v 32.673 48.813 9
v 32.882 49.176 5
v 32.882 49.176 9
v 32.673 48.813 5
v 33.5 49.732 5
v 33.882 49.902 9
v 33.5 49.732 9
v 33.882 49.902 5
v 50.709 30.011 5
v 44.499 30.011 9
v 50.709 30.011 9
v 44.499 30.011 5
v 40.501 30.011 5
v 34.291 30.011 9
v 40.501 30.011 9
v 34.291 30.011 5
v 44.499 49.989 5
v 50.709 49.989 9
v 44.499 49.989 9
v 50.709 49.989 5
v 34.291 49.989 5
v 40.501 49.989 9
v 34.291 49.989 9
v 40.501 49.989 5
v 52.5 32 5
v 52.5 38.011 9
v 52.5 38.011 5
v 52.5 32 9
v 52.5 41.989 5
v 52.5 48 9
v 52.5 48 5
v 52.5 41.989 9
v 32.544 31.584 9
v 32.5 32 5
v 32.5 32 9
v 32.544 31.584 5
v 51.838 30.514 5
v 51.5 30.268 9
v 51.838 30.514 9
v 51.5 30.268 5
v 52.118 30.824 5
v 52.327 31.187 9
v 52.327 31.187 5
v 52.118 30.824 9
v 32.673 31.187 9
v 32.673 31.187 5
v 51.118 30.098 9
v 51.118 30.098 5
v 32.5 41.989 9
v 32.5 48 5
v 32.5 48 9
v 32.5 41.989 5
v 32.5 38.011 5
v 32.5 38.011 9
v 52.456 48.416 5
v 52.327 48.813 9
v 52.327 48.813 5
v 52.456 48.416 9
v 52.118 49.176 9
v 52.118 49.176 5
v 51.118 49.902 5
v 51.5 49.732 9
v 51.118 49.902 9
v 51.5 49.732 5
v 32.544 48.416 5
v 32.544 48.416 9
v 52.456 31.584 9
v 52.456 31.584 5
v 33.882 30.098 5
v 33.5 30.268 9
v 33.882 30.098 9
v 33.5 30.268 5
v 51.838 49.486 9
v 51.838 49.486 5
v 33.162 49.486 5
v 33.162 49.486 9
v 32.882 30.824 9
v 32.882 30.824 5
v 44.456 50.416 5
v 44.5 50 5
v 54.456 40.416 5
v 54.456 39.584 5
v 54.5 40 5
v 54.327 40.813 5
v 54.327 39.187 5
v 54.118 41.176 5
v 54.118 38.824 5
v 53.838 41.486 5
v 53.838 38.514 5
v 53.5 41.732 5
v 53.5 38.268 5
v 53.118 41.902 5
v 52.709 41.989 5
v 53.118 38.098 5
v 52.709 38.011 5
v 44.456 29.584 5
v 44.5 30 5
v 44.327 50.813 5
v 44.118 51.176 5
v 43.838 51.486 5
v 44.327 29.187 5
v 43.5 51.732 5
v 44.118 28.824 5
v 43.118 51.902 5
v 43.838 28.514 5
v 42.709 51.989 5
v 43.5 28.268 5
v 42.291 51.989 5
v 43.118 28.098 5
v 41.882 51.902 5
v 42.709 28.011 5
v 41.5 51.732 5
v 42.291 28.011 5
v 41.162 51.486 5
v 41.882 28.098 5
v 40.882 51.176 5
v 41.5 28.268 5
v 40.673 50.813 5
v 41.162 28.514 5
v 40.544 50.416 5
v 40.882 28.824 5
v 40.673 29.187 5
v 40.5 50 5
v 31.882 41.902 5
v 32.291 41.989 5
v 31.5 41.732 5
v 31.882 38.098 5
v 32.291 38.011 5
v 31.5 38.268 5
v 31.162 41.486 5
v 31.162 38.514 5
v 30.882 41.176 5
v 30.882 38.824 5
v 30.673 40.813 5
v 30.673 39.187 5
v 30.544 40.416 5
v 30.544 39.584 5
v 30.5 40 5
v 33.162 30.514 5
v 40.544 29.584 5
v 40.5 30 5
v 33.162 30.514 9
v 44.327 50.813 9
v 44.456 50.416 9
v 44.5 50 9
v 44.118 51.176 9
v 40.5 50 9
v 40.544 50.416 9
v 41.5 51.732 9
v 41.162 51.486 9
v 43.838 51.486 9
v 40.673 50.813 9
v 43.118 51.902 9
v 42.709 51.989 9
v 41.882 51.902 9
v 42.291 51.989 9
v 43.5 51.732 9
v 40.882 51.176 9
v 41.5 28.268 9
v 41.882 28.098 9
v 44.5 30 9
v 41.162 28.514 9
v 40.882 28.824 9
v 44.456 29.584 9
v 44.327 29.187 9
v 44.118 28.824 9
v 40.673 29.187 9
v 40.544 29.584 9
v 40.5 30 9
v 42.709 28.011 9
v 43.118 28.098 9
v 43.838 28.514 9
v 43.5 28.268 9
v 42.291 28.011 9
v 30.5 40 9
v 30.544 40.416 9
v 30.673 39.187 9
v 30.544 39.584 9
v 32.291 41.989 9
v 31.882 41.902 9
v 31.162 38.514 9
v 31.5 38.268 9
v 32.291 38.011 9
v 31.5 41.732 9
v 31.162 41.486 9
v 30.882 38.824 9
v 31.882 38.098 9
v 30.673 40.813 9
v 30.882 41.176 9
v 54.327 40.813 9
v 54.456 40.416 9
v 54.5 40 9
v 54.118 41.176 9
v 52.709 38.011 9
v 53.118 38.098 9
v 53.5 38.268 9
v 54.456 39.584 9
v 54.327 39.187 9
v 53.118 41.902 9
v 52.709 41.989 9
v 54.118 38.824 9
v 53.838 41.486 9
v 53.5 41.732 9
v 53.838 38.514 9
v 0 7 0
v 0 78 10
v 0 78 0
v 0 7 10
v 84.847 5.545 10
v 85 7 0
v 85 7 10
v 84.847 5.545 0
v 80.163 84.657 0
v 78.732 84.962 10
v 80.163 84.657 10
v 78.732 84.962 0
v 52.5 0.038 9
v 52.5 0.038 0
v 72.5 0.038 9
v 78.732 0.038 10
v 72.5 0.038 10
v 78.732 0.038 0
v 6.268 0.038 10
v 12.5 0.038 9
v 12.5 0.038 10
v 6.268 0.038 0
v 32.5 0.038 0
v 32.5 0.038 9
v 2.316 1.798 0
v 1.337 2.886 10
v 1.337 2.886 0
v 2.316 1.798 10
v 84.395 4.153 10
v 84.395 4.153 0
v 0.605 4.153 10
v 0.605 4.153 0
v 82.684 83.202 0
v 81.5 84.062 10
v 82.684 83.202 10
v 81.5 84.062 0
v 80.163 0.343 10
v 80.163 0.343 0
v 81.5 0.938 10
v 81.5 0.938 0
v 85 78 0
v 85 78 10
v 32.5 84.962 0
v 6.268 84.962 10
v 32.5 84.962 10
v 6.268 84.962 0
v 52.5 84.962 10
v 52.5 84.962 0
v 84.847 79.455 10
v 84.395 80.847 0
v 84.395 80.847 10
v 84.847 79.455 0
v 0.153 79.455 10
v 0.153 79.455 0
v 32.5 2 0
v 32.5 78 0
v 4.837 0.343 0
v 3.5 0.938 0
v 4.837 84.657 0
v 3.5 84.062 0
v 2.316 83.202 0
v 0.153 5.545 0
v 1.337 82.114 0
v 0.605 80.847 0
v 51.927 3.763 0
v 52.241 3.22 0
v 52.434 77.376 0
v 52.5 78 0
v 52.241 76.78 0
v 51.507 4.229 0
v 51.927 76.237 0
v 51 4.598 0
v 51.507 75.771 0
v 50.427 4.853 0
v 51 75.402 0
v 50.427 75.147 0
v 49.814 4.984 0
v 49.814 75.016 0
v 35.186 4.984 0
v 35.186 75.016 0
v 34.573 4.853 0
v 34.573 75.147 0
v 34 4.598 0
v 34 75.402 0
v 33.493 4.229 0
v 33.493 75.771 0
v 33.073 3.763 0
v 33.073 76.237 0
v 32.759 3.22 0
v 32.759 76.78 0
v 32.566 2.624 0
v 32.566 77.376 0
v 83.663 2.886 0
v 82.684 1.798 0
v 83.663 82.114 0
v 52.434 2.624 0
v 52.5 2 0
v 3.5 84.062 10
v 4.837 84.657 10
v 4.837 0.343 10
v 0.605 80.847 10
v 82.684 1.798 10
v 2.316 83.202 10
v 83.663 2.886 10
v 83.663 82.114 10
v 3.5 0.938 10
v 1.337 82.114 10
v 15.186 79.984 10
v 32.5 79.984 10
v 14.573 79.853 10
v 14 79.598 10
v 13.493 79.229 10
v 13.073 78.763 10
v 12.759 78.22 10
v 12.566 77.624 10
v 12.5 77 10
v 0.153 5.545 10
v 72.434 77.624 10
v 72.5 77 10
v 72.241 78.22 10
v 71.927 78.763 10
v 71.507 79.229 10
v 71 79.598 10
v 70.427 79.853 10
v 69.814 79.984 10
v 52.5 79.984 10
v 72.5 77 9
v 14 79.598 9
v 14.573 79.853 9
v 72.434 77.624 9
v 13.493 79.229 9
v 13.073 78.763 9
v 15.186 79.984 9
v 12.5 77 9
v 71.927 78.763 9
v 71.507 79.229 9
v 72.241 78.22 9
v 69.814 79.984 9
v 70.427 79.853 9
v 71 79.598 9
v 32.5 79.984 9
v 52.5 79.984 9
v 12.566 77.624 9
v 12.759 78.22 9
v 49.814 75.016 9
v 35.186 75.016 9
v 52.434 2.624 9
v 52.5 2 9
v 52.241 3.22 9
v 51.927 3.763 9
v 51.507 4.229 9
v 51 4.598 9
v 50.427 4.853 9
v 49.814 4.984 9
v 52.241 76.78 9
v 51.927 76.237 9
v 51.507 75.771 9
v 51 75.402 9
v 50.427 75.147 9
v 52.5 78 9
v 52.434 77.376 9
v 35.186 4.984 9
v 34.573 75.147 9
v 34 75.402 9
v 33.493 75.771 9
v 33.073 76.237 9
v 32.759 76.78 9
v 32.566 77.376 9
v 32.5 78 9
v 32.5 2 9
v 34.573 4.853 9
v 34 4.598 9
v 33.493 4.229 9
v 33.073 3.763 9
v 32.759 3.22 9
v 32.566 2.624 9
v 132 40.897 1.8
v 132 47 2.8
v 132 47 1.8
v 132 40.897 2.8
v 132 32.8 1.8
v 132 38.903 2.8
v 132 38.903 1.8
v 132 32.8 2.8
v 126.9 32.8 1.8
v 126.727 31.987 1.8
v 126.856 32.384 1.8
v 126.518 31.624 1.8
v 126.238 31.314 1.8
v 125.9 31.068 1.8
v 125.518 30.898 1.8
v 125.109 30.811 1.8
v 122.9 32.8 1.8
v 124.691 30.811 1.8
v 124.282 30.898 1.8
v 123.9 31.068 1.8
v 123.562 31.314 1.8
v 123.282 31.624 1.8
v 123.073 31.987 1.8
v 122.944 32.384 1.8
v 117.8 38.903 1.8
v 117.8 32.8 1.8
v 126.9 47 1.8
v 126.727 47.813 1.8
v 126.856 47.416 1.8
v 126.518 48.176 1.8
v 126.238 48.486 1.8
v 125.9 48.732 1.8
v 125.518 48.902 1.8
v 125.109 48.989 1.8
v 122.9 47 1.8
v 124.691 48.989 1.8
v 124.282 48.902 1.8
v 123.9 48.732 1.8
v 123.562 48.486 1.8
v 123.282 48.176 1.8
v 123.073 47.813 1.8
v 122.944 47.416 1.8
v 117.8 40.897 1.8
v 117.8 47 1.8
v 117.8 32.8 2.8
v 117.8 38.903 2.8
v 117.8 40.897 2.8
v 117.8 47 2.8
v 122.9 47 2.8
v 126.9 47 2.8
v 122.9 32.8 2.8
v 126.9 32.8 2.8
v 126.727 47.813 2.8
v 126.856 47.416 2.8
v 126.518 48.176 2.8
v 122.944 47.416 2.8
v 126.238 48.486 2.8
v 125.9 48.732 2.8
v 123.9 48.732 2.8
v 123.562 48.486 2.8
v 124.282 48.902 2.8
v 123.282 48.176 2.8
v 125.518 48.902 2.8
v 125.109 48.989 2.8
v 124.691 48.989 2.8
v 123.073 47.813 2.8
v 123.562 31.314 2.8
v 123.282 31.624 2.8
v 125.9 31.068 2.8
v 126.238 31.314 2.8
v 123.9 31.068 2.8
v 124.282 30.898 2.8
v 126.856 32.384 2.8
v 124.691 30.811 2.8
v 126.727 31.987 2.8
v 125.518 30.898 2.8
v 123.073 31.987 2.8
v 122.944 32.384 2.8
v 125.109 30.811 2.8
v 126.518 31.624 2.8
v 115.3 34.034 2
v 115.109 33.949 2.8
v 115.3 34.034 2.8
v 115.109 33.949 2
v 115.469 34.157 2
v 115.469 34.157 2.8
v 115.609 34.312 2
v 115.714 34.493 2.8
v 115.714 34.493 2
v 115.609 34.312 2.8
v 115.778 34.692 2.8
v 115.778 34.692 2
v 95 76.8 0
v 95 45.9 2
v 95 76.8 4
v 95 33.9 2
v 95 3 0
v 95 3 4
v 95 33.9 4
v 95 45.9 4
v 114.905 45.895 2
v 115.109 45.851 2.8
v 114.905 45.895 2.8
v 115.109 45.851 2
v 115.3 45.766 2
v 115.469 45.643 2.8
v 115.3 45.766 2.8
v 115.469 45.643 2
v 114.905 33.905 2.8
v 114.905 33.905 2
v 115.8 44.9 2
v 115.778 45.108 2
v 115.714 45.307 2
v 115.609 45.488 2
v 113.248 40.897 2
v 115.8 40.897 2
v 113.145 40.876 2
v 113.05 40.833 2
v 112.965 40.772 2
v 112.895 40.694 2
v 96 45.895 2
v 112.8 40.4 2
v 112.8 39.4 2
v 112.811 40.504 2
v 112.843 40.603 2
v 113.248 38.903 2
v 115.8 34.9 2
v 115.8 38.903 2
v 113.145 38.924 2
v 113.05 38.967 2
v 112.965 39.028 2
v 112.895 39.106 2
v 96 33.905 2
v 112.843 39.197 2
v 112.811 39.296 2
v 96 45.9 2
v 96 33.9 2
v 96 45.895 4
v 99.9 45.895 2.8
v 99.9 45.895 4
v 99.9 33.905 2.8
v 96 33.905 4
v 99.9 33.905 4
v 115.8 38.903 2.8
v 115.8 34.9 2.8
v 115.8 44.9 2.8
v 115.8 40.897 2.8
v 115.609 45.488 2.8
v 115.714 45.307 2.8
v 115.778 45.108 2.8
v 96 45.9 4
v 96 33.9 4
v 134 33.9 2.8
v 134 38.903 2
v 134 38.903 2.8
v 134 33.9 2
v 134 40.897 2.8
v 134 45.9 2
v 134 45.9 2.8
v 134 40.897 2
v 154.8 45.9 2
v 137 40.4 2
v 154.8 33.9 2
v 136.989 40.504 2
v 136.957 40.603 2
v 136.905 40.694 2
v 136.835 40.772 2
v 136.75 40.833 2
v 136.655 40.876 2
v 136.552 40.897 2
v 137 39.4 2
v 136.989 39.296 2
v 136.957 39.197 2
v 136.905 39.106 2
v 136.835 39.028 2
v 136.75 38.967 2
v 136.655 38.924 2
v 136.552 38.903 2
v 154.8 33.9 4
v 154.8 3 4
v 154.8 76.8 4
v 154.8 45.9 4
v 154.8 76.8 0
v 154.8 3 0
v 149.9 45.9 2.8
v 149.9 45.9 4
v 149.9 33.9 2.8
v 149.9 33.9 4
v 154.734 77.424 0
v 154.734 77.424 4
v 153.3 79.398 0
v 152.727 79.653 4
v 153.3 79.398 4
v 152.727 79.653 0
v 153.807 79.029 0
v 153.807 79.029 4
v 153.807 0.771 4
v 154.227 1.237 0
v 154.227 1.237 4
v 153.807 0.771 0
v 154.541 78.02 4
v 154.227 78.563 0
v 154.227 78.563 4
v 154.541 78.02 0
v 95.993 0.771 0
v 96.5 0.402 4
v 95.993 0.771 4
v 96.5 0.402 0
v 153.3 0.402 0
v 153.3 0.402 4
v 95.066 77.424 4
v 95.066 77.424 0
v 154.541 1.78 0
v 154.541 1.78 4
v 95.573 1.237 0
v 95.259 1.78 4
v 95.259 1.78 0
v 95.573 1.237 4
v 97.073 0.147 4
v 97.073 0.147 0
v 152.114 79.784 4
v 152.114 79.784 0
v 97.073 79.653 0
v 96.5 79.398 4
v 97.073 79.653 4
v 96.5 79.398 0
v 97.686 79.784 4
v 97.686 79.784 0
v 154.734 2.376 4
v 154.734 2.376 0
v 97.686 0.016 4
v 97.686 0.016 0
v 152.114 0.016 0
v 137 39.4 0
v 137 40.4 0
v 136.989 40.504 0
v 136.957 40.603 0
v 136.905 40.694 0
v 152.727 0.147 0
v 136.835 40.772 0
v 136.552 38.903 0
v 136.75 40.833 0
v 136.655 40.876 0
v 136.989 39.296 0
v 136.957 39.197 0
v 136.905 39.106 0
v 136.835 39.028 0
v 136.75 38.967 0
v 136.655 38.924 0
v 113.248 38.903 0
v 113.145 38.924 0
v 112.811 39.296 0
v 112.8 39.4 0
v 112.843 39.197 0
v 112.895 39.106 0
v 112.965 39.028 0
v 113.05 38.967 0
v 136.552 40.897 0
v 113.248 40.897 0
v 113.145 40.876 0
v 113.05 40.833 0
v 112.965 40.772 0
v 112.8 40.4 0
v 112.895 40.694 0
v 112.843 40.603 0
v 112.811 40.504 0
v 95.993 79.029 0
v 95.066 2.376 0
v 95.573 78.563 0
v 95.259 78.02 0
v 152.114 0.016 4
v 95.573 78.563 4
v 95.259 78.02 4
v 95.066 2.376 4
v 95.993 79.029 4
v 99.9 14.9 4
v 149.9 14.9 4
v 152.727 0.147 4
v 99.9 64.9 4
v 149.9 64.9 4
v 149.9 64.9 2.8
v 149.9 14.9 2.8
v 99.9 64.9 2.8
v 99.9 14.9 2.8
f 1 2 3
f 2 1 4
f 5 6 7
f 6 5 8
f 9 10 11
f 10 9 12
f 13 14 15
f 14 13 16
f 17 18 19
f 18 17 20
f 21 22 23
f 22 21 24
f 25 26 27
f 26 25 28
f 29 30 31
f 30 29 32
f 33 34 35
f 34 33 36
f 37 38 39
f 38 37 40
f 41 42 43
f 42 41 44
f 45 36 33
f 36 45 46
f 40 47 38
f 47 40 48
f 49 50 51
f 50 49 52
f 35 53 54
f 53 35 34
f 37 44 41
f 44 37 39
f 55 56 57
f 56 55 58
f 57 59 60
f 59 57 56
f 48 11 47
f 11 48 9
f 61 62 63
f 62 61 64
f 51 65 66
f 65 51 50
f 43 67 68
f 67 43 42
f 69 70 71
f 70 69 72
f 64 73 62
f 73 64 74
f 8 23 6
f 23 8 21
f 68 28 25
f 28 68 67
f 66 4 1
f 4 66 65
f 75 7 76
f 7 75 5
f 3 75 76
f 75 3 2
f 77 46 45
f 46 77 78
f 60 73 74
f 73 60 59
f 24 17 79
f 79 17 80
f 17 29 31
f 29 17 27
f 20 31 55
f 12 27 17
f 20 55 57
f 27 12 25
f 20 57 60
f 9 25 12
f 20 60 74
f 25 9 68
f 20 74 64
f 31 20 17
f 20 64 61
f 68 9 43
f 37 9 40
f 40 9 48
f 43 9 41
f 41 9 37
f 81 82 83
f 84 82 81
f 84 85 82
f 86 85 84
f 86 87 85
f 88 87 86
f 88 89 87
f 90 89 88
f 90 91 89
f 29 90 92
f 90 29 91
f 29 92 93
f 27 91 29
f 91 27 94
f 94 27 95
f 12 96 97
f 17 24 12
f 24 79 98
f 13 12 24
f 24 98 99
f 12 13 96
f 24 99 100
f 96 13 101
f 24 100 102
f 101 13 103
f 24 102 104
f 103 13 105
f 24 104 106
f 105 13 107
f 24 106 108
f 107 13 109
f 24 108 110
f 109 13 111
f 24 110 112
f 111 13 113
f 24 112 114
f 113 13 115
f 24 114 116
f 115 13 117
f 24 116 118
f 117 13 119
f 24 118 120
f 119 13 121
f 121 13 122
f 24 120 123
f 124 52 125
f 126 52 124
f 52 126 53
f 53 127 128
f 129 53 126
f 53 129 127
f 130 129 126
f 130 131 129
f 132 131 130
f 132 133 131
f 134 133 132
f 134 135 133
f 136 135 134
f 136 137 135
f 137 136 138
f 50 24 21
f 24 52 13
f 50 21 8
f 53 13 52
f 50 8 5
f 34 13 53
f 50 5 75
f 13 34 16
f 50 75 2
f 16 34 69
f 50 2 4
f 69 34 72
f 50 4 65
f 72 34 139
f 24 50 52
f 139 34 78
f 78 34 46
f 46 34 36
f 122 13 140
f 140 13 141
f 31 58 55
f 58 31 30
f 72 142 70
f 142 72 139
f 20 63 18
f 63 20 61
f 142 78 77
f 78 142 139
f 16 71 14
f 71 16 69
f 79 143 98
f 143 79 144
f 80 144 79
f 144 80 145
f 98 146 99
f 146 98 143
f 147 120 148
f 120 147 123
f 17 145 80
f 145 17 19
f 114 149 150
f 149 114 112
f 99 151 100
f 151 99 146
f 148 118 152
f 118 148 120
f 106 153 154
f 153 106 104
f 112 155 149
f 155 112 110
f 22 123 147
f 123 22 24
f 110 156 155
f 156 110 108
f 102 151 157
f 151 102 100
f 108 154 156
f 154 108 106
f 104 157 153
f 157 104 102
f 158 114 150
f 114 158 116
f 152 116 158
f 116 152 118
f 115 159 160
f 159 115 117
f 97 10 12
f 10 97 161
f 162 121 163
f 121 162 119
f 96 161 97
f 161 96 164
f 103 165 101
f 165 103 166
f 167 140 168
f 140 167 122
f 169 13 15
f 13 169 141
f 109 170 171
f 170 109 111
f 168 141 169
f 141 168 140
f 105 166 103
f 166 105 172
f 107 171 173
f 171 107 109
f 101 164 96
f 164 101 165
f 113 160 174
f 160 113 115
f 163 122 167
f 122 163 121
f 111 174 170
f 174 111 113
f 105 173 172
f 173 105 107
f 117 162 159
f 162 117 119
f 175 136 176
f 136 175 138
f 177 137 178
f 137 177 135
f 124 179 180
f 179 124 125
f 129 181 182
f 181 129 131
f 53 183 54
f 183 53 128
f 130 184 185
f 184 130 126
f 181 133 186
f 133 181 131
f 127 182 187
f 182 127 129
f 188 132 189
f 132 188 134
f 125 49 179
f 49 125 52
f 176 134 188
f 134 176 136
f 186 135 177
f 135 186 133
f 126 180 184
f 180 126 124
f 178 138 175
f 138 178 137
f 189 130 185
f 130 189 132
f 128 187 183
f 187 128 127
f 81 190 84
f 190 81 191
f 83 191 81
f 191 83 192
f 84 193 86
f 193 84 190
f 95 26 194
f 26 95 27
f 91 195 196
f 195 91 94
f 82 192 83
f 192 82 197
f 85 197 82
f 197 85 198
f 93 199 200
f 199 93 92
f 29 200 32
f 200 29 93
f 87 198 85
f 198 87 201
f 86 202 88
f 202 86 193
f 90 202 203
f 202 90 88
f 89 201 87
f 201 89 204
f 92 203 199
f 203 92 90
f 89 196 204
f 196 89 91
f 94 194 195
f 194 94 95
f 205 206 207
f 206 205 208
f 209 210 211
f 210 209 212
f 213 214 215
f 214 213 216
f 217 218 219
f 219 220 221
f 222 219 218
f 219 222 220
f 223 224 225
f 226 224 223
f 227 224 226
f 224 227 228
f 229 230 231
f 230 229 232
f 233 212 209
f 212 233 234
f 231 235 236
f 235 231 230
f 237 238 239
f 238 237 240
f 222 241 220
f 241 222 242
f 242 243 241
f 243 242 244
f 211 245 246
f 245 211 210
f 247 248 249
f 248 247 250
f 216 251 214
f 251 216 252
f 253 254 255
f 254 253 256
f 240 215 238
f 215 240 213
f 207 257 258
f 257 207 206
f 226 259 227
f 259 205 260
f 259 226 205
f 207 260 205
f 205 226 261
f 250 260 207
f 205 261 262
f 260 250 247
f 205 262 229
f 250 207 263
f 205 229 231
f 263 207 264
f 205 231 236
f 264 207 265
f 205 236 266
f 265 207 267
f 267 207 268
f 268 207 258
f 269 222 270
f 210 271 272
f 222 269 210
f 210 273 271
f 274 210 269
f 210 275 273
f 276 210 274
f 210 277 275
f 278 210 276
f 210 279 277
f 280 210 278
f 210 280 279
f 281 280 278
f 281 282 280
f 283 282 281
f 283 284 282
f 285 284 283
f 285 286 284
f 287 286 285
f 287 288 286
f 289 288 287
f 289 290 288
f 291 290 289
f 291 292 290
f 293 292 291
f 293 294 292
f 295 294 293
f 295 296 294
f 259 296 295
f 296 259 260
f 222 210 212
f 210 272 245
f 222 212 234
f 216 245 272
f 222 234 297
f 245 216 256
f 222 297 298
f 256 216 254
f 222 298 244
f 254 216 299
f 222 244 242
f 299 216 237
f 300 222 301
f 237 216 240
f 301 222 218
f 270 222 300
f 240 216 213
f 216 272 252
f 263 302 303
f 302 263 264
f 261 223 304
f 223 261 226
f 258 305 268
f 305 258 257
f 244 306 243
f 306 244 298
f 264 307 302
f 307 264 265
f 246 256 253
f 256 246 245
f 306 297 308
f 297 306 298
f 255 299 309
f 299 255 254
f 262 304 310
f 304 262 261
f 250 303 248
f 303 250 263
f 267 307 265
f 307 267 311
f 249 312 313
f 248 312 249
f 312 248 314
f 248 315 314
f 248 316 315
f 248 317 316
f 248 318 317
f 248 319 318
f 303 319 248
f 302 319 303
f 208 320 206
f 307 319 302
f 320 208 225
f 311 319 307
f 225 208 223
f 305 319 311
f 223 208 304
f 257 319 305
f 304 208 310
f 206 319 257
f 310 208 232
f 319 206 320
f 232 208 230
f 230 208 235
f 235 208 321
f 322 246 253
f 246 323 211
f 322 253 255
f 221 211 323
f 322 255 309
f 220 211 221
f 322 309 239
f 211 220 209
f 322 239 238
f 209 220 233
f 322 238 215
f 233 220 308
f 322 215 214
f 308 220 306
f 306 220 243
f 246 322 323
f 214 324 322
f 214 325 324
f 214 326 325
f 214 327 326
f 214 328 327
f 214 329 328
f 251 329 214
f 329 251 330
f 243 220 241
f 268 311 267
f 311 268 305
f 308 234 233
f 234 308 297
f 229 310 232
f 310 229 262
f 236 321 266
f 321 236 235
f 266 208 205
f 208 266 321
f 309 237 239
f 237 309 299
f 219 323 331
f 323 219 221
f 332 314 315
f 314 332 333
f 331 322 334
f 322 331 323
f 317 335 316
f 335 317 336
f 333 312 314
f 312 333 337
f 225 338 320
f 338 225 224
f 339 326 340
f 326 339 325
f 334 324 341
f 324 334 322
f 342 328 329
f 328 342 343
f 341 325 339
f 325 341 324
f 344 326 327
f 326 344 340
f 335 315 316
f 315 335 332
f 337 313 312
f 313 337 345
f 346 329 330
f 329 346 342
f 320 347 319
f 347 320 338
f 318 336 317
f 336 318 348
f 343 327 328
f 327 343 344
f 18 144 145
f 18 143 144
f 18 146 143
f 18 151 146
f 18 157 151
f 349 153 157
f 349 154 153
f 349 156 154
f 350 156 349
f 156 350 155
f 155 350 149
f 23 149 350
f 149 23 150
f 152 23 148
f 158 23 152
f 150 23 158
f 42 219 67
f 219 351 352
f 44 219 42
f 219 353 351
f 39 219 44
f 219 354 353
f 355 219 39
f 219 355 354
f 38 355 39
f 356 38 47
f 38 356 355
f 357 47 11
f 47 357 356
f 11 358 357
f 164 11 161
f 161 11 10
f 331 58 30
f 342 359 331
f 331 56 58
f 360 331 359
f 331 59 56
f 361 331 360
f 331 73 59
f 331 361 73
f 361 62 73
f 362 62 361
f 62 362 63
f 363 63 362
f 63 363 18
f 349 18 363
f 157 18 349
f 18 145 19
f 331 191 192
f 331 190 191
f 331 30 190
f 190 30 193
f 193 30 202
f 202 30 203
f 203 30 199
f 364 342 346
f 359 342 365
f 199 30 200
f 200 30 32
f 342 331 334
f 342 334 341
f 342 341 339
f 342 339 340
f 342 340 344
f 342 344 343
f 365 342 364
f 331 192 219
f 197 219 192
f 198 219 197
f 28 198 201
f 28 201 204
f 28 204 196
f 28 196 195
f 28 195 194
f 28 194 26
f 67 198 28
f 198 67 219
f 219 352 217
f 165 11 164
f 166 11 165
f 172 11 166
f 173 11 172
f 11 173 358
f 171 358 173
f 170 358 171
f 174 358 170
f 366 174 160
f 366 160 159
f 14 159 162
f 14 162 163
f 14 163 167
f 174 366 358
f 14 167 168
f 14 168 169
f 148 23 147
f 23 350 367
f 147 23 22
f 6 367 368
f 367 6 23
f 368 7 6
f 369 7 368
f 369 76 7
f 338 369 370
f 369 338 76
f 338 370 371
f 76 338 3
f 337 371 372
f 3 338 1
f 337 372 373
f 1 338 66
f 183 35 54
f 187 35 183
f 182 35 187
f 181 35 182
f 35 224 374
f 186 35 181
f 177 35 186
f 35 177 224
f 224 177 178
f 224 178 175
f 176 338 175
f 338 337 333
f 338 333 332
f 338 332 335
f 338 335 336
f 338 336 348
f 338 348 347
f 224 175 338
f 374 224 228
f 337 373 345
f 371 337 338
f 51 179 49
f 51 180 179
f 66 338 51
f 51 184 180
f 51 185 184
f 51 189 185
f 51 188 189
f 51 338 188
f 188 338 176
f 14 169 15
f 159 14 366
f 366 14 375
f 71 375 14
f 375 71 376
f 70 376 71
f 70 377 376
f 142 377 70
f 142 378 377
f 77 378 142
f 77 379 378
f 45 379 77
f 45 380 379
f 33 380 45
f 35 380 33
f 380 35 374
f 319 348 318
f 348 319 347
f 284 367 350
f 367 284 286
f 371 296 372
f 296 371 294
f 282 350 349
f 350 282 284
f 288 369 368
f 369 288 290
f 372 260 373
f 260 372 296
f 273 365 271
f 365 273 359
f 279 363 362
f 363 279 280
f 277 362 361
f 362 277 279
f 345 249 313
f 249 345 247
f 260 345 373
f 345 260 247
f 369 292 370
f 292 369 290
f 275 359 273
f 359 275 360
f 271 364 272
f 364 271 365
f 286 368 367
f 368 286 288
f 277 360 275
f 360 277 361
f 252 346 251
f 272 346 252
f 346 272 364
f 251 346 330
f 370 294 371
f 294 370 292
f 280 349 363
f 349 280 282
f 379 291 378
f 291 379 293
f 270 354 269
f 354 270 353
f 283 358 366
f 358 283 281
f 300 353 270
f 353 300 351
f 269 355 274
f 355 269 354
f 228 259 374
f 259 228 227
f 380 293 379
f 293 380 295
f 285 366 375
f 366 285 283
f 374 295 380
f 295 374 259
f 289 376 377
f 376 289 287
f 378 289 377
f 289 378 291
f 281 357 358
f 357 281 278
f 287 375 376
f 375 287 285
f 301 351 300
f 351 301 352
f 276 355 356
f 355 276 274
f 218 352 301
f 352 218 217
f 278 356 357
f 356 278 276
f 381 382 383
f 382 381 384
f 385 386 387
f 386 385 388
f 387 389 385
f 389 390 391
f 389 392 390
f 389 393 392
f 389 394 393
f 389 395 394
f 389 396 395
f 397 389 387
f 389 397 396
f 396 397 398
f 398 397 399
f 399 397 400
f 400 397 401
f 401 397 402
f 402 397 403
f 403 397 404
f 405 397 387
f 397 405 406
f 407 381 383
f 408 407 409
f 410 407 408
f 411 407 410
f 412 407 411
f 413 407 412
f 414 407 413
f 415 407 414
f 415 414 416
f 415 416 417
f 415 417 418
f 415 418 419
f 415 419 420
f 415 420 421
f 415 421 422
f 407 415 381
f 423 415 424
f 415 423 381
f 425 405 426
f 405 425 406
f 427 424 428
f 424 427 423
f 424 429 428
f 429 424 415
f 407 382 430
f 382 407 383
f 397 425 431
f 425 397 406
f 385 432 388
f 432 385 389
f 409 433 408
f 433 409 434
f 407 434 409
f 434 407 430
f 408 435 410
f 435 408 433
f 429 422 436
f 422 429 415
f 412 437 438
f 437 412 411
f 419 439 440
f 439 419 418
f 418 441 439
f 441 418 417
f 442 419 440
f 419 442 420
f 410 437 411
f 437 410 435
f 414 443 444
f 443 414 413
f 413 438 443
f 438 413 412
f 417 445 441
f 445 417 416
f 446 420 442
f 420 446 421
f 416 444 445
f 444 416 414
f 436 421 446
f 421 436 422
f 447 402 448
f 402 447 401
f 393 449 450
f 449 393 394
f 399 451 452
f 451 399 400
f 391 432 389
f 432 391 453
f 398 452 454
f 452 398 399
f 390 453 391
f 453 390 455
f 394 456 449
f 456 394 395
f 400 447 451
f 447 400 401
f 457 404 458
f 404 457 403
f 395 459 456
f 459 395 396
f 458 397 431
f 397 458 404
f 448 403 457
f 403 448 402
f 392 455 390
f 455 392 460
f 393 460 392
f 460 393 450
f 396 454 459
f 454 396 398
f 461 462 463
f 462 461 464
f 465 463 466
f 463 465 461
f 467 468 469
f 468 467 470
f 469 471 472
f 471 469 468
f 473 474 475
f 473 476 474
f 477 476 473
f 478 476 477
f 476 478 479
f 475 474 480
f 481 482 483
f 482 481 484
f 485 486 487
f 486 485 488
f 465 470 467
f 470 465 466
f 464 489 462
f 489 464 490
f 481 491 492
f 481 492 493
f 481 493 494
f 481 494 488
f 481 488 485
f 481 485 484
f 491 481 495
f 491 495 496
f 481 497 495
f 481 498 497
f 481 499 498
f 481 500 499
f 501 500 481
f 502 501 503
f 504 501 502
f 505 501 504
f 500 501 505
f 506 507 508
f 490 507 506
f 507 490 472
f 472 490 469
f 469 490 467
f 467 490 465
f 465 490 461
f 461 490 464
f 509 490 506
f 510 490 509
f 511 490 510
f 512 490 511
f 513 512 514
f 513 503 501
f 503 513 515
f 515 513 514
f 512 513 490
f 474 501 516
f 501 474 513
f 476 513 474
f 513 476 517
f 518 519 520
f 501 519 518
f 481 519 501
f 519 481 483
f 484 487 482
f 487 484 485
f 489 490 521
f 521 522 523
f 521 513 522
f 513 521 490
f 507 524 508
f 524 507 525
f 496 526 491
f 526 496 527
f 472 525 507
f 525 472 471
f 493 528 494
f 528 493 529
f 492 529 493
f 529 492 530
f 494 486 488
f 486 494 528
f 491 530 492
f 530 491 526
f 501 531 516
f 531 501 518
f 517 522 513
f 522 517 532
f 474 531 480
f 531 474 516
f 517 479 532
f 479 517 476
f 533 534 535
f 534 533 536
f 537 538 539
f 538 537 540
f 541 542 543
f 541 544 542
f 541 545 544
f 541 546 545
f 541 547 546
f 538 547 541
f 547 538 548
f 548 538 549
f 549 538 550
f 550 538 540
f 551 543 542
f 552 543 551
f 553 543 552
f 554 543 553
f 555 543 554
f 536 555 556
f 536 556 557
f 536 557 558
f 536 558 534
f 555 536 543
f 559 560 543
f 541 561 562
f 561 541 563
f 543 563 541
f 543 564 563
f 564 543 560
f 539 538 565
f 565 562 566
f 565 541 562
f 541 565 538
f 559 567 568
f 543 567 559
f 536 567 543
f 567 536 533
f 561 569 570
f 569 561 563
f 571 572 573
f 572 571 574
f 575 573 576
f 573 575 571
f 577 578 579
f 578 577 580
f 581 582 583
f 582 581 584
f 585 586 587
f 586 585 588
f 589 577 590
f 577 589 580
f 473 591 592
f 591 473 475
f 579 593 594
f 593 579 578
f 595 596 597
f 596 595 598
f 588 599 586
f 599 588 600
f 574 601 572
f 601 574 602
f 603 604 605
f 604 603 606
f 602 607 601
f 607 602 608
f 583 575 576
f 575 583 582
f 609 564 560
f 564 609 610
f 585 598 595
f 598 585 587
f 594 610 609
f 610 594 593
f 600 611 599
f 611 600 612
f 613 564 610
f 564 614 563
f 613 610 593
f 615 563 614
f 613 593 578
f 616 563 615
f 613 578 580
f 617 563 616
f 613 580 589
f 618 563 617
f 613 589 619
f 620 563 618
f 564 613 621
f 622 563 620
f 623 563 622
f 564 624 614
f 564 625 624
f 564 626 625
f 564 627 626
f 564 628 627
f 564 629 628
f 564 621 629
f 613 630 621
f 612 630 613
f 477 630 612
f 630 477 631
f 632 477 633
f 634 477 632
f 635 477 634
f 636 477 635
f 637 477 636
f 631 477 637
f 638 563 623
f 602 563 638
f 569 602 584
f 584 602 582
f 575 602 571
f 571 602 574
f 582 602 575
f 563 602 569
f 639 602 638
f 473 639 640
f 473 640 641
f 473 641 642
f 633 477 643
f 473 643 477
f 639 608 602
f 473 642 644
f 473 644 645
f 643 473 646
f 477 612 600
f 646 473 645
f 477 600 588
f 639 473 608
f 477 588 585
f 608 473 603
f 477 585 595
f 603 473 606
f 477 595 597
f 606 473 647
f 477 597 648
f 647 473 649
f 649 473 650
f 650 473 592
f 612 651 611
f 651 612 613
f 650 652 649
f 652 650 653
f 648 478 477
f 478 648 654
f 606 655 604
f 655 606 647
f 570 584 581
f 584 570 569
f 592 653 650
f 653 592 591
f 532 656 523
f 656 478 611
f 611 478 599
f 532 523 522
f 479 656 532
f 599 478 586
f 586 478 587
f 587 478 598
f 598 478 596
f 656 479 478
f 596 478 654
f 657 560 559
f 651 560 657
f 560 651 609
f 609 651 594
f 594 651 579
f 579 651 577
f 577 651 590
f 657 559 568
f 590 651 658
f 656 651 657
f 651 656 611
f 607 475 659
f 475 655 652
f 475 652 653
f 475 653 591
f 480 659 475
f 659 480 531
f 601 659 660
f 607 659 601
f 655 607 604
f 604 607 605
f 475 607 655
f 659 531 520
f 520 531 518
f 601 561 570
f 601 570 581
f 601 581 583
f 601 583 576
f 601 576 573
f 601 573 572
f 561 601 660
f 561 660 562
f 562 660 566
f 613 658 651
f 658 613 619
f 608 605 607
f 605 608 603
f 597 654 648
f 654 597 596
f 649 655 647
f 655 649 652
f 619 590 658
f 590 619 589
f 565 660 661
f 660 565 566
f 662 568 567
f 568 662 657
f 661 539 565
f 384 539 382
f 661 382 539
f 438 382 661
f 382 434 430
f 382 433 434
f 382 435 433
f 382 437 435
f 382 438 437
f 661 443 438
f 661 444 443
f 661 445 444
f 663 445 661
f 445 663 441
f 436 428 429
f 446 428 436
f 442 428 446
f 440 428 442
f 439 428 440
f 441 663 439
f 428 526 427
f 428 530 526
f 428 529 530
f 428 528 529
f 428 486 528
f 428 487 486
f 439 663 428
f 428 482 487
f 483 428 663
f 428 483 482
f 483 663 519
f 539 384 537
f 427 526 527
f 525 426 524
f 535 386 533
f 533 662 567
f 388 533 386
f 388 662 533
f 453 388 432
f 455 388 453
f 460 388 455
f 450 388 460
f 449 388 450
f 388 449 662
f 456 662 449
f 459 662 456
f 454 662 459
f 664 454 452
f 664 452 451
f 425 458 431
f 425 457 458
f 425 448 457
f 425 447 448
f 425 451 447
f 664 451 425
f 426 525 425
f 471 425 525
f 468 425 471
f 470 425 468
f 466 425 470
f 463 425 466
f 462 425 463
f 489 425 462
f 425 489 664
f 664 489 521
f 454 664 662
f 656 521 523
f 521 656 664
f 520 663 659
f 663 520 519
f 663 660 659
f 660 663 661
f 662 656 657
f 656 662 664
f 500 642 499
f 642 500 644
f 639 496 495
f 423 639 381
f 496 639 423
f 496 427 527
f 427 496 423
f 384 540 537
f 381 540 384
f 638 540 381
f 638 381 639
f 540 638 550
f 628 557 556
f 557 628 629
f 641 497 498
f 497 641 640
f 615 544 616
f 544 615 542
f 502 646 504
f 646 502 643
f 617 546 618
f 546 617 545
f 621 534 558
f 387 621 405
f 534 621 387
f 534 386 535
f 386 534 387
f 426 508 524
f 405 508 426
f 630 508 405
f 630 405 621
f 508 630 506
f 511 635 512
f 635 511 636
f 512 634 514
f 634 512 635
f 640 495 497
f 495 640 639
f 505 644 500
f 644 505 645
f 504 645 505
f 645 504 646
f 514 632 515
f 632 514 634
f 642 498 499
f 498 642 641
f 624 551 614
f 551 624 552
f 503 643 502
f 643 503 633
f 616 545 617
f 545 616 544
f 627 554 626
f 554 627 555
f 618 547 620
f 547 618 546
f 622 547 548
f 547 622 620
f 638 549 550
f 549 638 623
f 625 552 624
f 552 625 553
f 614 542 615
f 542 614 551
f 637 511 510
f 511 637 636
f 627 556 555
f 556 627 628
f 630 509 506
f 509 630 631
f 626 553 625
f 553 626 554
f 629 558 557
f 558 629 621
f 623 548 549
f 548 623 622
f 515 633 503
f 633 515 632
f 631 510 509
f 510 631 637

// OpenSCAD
// file: lib/squircle.scad
module squircle(size = [1, 1, 1], r = 0.5, center = false) {
  x = size[0] - r * 2;
  y = size[1] - r * 2;
  z = size[2];
  
  translate(center ? [-(x / 2), -(y / 2), 0] : [r, r, 0])
  hull() {
    translate([0, 0, 0]) cylinder(z, r = r);
    translate([x, 0, 0]) cylinder(z, r = r);
    translate([0, y, 0]) cylinder(z, r = r);
    translate([x, y, 0]) cylinder(z, r = r);
  }
}

module squircle_outline(size = [1, 1, 1], width = 1, r = 0.5, center = false) {
  
  difference() {
    squircle(size, r, center);

    translate([width, width, -1])
    squircle([size[0] - width * 2, size[1] - width * 2, size[2] + 2], r, center);
  }
}
// file: pit/pit-chiptray.scad
use <../lib/squircle.scad>

module pit_chiptray(size, chip, mesh) {

  tray_center = [(size[0]) / 2, size[1] / 2];

  difference() {

    // chip tray
    squircle(size, 3);

    // groove for steel mesh
    translate([tray_center[0] - mesh[0] / 2, tray_center[1] - mesh[1] / 2, size[2] - 1 - mesh[2]])
    cube([mesh[0], mesh[1], size[2] - 1 - mesh[2]], center = false);

    // groove for chip
    translate([tray_center[0] - chip[0] / 2, tray_center[1] - chip[1] / 2, size[2] - 1 - mesh[2] - chip[2]]) {

      // main
      cube([chip[0], chip[1], size[2] - 1 - mesh[2] - chip[2]], center = false);

      // handlers
      translate([chip[0] / 2, chip[1], 0])
      cylinder(5, 2, 2, center = false);

      translate([chip[0] / 2, 0, 0])
      cylinder(5, 2, 2, center = false);
    }

    // left and right bars
    bar_length = (size[0] - chip[0] - 4) / 2;
    translate([0, size[1] / 2 - 6, size[2] / 2]) {
      squircle([bar_length, 12, size[2]], 1);
      cube([1, 12, size[2]], center = false);
    }

    translate([size[0] - bar_length, size[1] / 2 - 6, size[2] / 2]) {
      squircle([bar_length, 12, size[2]], 1);
      cube([bar_length, 12, size[2]], center = false);
    }

    // the hole under the chip
    translate([tray_center[0] - (chip[0] / 2 + 5), tray_center[1] - 1, 0])
    squircle([chip[0] + 10, 2, size[2]]);
  }
}
// file: pit/pit-base.scad
use <../lib/squircle.scad>

module pit_base(size, chiptray) {

  difference() {

    // body
    squircle(size, 7);

    // cutout for chiptray
    translate([(size[0] - chiptray[0]) / 2, 0, size[2] - 1]) {

      hull() {

        // groove for chiptray
        squircle(chiptray, 3);

        // remove bottom corners
        cube([chiptray[0], 3, chiptray[2]]);
      }
    }

    // groove of bottom magnet
    tray_center = [(size[0] - chiptray[0]) / 2 + chiptray[0] / 2, chiptray[1] / 2];
    translate([tray_center[0], tray_center[1], size[2] - 5]) {
      
      translate([-10, -10, 0])
      squircle([20, 20, 5], 2);

      translate([0, 10, 0])
      cylinder(5, 2, 2, center = false);

      translate([0, -10, 0])
      cylinder(5, 2, 2, center = false);

      translate([-10, 0, 0])
      cylinder(5, 2, 2, center = false);

      translate([10, 0, 0])
      cylinder(5, 2, 2, center = false);
    }

    // top shape cutout
    translate([(size[0] - 20) / 2, size[1] - 10, 0])
    squircle([20, 20, size[2]], 3);

    // bottom shape cutout
    translate([(size[0] - 20) / 2, -15, 0])
    squircle([20, 20, size[2]], 3);
  }
}
// main file
use <pit/pit-base.scad>
use <pit/pit-chiptray.scad>

$fs = 0.1;

// pit-base [x, y, z]
pitbase_size  = [85, 85, 10];

// pit-chiptray [x, y, z]
chiptray_size = [60, 80,  4];

// chip package size [x, y, z]
chip_size = [14, 14, 1];

// steel mesh size [x, y, z]
steel_mesh_size = [50, 50, 0.2];

pit_base(
  size     = pitbase_size,
  chiptray = chiptray_size
);

// 0.2 is the tolerance
translate([pitbase_size[1] + 10, 0, 0])
pit_chiptray(
  size = [chiptray_size[0] - 0.2, chiptray_size[1] - 0.2, chiptray_size[2]],
  chip = [chip_size[0] + 0.2, chip_size[1] + 0.2, chip_size[2]],
  mesh = steel_mesh_size
);
